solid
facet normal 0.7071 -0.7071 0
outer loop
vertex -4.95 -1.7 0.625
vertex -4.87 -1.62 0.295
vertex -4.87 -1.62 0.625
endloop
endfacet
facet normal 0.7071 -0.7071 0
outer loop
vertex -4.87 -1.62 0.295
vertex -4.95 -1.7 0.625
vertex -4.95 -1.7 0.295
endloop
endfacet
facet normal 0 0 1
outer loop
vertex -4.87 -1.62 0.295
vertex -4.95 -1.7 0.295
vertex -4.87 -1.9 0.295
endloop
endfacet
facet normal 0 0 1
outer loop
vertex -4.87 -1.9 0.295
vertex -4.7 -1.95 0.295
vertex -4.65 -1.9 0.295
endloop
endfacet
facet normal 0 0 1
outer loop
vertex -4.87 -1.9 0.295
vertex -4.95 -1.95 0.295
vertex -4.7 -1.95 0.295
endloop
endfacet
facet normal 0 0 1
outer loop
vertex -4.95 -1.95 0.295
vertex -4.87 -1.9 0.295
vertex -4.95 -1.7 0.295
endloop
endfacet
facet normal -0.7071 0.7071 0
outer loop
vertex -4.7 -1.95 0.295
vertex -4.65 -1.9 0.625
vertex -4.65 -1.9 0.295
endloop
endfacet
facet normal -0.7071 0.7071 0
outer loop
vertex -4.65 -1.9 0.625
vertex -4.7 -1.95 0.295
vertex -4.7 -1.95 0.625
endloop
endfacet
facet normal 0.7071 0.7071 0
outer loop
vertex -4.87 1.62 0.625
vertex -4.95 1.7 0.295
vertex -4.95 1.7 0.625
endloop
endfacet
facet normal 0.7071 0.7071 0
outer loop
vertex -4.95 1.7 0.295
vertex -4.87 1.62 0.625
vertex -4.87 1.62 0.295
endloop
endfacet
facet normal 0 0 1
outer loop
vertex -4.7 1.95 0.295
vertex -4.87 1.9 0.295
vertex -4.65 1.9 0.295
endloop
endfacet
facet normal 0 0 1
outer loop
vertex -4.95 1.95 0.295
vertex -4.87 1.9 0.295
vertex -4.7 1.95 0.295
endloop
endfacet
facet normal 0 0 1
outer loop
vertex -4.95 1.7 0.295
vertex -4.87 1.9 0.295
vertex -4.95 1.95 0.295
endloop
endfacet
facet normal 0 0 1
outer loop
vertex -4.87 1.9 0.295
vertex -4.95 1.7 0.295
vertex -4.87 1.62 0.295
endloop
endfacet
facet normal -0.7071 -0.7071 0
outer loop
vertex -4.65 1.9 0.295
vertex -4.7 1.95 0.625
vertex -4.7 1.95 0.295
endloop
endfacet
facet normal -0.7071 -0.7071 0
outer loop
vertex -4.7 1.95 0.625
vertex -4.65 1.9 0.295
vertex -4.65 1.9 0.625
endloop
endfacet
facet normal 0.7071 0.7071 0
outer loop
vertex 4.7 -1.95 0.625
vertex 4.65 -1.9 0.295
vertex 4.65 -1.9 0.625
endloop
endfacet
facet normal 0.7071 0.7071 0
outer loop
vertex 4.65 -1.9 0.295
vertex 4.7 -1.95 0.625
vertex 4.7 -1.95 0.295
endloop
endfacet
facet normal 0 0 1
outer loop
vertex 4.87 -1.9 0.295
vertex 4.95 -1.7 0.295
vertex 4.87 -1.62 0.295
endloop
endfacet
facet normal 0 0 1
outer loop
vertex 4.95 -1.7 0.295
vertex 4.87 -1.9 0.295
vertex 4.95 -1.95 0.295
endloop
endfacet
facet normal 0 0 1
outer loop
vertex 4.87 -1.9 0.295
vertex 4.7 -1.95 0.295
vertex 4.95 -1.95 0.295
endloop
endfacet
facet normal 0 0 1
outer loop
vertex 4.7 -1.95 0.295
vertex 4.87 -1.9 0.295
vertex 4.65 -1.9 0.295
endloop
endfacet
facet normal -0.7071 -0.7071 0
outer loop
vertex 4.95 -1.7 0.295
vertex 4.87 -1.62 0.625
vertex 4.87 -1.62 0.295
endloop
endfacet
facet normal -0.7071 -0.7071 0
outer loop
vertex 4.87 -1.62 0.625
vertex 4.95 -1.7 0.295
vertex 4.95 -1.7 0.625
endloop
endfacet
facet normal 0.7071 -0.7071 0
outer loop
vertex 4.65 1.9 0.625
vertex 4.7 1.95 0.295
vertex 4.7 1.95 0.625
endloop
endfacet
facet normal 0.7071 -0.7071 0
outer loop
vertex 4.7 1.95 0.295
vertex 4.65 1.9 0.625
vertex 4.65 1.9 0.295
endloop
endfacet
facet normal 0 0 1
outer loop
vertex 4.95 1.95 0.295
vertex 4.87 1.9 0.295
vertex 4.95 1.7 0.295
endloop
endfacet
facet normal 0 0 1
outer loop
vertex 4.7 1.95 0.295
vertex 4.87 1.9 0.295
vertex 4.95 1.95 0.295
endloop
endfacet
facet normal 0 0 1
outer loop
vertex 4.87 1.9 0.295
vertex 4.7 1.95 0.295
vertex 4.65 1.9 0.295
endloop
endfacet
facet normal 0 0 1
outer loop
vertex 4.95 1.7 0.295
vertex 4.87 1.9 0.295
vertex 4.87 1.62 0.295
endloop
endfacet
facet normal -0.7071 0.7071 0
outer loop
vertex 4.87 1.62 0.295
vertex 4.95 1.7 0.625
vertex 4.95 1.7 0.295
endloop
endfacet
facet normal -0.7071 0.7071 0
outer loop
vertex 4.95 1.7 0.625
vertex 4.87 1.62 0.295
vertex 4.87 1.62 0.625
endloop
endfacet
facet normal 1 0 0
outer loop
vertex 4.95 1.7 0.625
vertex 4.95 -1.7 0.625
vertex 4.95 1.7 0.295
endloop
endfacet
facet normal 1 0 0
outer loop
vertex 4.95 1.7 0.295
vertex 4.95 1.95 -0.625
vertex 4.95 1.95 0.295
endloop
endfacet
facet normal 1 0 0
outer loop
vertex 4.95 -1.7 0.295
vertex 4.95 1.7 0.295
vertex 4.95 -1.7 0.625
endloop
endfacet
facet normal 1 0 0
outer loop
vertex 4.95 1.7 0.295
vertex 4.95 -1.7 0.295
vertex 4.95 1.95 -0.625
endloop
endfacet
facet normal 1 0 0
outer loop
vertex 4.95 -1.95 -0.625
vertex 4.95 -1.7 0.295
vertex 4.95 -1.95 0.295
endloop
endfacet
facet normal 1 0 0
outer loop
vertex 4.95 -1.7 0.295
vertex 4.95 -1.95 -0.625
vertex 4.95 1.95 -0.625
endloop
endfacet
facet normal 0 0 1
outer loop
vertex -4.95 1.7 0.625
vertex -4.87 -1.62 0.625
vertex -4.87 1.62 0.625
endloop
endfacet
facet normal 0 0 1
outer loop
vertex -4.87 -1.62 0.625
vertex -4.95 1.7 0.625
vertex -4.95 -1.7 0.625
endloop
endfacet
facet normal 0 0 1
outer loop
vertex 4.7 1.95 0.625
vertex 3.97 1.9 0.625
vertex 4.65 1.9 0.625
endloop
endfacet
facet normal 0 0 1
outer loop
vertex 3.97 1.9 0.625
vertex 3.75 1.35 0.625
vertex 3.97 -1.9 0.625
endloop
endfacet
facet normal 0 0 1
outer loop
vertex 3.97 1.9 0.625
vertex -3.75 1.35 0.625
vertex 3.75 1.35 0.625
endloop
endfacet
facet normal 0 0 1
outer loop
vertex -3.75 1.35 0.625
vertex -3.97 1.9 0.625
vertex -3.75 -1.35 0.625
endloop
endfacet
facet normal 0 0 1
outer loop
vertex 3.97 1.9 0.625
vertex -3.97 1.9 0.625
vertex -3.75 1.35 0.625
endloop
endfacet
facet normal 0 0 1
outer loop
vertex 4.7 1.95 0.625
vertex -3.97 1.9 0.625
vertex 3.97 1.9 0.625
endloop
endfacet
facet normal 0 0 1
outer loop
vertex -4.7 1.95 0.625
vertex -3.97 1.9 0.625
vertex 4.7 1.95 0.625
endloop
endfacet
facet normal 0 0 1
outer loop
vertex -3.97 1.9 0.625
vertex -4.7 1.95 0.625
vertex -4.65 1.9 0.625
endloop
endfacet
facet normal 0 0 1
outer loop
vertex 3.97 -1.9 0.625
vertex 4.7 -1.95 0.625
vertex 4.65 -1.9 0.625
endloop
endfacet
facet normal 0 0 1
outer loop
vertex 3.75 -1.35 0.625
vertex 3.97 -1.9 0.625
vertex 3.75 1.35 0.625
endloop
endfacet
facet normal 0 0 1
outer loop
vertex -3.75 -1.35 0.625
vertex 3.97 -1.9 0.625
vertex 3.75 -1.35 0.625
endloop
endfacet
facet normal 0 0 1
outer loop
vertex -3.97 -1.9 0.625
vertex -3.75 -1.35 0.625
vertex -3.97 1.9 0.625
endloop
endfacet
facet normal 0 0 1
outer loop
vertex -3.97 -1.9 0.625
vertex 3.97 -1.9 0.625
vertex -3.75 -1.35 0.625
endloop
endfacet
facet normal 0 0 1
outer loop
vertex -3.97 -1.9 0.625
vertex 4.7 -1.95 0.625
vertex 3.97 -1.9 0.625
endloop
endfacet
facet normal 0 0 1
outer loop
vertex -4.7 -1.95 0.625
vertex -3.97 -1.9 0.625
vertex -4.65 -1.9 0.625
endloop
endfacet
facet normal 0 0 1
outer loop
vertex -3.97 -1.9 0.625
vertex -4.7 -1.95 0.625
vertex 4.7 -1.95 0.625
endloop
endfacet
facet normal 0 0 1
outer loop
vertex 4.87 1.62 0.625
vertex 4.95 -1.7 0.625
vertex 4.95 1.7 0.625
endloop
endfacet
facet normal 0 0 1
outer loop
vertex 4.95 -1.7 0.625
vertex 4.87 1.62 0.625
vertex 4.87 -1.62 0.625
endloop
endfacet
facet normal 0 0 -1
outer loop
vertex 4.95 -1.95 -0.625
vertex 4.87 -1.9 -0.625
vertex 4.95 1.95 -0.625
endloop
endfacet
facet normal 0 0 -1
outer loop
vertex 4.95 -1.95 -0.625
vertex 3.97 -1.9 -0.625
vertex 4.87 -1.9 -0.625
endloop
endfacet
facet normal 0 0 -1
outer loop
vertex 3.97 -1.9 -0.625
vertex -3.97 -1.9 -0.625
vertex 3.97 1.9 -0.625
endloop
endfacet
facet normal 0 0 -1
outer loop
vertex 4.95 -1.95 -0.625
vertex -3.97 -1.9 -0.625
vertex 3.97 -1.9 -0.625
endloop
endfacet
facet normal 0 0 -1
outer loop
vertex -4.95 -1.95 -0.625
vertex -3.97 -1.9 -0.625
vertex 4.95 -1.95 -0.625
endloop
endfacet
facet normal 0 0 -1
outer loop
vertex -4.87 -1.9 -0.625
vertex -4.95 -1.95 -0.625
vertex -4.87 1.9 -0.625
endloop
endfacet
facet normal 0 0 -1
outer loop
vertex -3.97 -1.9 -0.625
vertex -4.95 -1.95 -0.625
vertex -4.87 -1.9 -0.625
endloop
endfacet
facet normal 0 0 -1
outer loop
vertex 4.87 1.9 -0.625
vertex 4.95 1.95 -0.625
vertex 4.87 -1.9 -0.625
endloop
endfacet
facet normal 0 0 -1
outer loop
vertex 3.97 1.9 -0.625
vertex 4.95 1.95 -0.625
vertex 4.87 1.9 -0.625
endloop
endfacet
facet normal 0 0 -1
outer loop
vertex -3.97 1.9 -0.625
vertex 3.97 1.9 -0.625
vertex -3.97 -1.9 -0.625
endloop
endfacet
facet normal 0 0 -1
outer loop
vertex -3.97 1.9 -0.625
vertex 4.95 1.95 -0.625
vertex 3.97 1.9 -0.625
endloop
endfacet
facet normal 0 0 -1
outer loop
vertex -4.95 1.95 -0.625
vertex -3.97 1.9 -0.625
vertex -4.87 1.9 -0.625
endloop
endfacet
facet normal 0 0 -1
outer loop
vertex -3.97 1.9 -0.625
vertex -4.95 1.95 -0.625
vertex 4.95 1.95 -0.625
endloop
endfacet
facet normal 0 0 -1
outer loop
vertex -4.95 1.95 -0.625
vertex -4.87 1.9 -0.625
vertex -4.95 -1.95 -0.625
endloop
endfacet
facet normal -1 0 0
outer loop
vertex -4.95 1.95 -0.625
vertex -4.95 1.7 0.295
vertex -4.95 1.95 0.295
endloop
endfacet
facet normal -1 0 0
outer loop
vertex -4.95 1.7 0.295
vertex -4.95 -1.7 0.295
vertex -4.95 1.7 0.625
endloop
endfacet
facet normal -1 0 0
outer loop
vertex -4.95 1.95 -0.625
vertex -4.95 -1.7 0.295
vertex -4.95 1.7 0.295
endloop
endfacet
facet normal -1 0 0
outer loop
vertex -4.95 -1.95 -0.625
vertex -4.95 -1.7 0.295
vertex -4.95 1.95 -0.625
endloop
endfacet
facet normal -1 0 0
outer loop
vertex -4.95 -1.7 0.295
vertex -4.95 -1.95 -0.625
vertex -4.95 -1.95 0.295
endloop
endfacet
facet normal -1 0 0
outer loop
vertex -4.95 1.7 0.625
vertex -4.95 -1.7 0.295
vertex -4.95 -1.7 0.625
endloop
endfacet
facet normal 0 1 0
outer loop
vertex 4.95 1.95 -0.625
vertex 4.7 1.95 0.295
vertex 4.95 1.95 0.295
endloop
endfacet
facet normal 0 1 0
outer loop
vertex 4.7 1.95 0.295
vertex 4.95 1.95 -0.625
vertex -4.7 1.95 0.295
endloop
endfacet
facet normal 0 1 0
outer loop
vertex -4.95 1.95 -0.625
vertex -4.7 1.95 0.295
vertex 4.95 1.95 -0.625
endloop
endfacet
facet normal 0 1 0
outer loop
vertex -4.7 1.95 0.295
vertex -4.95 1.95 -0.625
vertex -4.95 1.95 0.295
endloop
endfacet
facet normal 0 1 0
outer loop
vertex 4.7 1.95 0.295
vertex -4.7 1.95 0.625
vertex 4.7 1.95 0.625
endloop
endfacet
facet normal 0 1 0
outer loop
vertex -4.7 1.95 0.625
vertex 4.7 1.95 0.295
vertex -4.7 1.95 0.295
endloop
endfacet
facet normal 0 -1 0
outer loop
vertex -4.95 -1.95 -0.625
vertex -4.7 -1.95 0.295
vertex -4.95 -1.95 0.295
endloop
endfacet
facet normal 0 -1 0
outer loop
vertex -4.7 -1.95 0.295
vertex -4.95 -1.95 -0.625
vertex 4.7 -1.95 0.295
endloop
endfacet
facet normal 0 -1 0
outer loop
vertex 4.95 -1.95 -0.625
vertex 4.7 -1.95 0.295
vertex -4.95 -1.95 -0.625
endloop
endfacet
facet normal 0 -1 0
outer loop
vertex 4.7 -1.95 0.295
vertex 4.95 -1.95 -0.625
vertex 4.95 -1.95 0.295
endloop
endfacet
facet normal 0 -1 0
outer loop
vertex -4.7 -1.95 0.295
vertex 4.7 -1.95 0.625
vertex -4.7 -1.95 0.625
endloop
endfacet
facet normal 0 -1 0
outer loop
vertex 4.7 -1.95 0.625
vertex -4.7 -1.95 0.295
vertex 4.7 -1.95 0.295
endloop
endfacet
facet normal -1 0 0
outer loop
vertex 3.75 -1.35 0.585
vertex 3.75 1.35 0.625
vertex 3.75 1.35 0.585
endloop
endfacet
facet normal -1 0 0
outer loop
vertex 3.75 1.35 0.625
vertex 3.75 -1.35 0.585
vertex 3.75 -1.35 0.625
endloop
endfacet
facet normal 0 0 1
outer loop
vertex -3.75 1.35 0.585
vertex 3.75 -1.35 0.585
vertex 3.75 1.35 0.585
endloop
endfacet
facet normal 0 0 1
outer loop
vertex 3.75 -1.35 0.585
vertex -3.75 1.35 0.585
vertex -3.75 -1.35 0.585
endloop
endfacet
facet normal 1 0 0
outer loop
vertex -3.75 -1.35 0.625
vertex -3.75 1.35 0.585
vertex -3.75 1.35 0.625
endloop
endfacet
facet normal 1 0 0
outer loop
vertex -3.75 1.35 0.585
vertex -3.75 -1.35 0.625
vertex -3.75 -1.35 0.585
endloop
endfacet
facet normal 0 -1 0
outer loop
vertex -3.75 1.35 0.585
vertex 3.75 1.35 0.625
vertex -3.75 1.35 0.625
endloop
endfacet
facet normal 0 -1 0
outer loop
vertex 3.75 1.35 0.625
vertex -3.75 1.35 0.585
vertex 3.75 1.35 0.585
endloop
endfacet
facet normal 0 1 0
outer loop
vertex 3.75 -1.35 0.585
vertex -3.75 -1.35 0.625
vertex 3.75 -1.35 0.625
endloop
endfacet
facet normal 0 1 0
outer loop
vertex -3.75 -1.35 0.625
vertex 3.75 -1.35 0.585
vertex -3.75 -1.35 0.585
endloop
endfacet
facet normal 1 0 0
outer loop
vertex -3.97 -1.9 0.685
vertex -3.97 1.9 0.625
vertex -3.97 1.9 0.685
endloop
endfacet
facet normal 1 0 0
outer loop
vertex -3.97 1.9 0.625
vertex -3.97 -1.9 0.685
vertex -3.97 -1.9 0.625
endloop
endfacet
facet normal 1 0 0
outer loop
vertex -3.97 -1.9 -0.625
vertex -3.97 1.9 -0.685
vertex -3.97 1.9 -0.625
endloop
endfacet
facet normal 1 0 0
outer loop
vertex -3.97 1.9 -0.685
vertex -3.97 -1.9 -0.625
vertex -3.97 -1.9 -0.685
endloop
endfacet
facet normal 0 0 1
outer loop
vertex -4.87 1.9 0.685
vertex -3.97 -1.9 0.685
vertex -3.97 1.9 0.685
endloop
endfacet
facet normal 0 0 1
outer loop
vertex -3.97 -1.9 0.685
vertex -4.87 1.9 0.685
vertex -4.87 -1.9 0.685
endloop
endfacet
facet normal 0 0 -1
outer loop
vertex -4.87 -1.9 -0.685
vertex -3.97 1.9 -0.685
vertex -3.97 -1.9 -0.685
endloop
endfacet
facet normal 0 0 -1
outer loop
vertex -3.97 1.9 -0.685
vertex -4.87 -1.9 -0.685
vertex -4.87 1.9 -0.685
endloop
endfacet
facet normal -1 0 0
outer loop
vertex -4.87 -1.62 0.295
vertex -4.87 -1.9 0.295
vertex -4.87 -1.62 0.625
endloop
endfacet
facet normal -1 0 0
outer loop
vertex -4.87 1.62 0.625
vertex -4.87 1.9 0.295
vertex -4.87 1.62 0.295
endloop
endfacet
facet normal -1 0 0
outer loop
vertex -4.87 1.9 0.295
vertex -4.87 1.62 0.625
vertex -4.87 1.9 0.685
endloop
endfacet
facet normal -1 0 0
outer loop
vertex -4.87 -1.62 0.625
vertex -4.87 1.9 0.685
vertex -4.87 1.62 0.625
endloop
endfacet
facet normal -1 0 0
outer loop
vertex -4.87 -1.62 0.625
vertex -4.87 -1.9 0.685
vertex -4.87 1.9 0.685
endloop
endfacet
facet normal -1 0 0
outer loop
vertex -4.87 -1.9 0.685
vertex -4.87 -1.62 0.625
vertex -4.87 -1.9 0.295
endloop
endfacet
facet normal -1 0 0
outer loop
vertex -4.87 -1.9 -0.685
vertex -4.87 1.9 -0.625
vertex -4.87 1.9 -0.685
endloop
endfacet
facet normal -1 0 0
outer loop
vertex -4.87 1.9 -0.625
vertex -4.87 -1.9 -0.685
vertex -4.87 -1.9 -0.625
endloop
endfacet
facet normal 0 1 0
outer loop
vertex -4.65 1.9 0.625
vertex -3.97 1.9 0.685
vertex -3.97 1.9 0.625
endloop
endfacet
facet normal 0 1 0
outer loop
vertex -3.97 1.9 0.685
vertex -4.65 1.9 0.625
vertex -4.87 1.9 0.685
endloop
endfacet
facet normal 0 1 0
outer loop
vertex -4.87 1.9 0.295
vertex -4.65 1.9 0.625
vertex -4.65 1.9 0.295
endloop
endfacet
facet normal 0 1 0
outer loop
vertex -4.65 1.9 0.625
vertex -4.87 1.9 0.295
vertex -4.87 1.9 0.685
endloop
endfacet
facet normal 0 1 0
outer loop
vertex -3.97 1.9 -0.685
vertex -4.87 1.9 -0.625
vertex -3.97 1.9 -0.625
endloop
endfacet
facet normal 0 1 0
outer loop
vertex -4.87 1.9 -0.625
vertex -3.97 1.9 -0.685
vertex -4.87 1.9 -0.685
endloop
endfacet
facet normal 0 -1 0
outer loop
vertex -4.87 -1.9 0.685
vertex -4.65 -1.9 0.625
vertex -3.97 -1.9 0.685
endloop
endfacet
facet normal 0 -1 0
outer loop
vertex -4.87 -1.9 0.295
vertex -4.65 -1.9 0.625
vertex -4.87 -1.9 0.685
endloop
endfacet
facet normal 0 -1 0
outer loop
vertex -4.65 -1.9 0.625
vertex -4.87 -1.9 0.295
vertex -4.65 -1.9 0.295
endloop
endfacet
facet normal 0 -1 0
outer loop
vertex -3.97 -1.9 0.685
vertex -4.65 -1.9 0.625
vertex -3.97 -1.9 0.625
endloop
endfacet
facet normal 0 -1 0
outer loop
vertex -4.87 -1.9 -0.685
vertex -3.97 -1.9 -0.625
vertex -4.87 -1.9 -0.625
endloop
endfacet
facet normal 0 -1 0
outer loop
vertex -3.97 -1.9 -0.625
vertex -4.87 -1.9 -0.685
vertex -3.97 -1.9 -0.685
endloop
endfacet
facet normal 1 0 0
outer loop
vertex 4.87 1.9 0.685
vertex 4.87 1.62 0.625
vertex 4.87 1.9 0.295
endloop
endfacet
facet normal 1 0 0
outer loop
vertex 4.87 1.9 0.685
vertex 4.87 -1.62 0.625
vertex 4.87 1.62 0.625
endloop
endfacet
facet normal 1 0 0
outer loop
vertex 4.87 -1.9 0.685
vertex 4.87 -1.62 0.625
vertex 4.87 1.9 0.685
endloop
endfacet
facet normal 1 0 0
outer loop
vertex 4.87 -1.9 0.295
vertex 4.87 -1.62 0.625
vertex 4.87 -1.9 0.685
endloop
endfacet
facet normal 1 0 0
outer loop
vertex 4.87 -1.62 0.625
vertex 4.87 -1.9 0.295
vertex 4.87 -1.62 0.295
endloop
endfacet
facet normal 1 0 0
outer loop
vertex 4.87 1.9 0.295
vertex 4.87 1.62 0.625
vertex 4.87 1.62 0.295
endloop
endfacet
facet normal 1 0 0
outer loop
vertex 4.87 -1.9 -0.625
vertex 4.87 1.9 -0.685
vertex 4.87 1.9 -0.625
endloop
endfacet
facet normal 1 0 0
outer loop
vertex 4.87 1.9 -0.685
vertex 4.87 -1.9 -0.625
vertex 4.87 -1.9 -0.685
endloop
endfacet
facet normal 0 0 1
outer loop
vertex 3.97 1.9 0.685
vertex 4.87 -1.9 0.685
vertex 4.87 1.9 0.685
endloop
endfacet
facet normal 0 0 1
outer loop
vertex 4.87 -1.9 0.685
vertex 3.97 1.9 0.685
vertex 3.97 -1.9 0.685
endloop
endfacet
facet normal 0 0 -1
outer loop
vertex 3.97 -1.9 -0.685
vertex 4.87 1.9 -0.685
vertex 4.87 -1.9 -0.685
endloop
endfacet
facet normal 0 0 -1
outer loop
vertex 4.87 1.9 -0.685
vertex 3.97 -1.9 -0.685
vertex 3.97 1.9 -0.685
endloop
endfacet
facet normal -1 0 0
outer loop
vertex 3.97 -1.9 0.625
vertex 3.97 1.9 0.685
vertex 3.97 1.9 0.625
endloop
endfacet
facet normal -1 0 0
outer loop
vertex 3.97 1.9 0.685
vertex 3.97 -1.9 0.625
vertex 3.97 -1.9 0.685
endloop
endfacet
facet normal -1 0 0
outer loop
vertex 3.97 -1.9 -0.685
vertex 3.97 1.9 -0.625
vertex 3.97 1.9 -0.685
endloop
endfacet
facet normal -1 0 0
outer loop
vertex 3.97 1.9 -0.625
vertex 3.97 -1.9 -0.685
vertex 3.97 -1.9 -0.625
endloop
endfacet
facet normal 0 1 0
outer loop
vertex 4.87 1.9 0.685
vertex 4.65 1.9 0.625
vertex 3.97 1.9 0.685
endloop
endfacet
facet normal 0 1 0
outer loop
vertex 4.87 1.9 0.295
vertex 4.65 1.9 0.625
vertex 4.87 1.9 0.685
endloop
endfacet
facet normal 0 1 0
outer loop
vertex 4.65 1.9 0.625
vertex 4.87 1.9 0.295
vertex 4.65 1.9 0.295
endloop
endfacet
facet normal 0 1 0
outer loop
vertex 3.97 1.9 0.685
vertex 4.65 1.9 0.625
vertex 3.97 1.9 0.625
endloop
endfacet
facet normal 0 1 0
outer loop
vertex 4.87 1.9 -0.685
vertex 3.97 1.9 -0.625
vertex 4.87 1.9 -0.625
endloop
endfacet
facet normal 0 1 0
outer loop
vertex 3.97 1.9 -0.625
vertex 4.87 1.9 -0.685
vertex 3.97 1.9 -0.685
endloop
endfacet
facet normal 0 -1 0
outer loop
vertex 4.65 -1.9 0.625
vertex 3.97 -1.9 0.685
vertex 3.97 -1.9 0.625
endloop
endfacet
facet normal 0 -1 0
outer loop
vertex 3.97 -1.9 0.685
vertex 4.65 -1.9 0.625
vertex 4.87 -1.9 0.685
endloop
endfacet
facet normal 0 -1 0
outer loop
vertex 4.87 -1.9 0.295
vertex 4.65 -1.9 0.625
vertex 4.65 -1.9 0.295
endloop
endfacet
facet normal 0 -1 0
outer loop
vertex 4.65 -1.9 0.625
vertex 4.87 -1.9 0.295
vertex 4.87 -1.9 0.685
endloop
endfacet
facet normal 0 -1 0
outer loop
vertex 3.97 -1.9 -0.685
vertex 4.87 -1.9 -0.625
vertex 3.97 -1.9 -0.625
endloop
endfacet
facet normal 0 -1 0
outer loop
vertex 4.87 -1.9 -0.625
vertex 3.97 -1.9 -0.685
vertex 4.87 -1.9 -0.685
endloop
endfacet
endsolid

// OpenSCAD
// SMD package target overall size: [9.90, 3.90, 1.25]
// One connected solid with visible end terminations and a shallow top recess.

$fn = 48;

// Target overall dimensions
body_length = 9.9;   //[5:20:0.1]
body_width  = 3.9;   //[2:8:0.1]
body_height = 1.25;  //[0.6:2.5:0.05]

// Visual details
marking_depth    = 0.08; //[0.02:0.2:0.01]
marking_margin_x = 1.2;  //[0.5:3:0.1]
marking_margin_y = 0.6;  //[0.3:2:0.1]

chamfer_size = 0.25; //[0.1:0.6:0.05]

// Terminations (end caps) - kept within overall length
metallization_length    = 0.9;  //[0.4:2:0.05]
metallization_inset     = 0.05; //[0:0.3:0.01]
metallization_thickness = 0.06; //[0.02:0.2:0.01]

// Small overlap to guarantee connectivity / robust booleans
overlap = 0.08; //[0.01:0.3:0.01]

// --- Helpers ---
function clamp(v, lo, hi) = min(max(v, lo), hi);

// Ensure termination length is valid and does not exceed half the body length
term_len = clamp(metallization_length, 0.2, body_length/2 - 0.05);

// --- Base shapes ---
module smd_body() {
  cube([body_length, body_width, body_height], center=true);
}

module top_marking_cut() {
  mx = max(0.01, body_length - 2*marking_margin_x);
  my = max(0.01, body_width  - 2*marking_margin_y);
  cube([mx, my, marking_depth], center=true);
}

// Chamfer cutters: remove small wedges at the 4 top corners (visible in renders)
module chamfer_cutters() {
  // Use rotated cubes to create diagonal chamfers at top corners
  for (sx = [-1, 1], sy = [-1, 1]) {
    translate([sx*(body_length/2 - chamfer_size/2),
               sy*(body_width/2  - chamfer_size/2),
               body_height/2 - chamfer_size/2])
      rotate([0,0,45])
        cube([chamfer_size*sqrt(2), chamfer_size*sqrt(2), chamfer_size + 2*overlap], center=true);
  }
}

// Termination pads: wrap around ends (top+bottom+side coverage) but stay within overall length
module metallization_pads() {
  pad_x = term_len;
  pad_y = max(0.01, body_width - 2*metallization_inset);
  pad_z = body_height + 2*metallization_thickness;

  // Place each pad so its OUTER face is flush with the body end (overall length remains body_length)
  // Center offset: body_end - pad_x/2 + small overlap into body
  xoff = (body_length/2 - pad_x/2) - overlap;

  for (sx = [-1, 1]) {
    translate([sx*xoff, 0, 0])
      cube([pad_x, pad_y, pad_z], center=true);
  }
}

// Body with marking recess and chamfers
module body_with_details() {
  difference() {
    smd_body();

    // Marking recess on top face
    translate([0, 0, body_height/2 - marking_depth/2 + overlap/2])
      top_marking_cut();

    // Top corner chamfers
    chamfer_cutters();
  }
}

// Final connected model
module complete_model() {
  union() {
    body_with_details();
    metallization_pads();
  }
}

color([0.85, 0.85, 0.8]) complete_model();
